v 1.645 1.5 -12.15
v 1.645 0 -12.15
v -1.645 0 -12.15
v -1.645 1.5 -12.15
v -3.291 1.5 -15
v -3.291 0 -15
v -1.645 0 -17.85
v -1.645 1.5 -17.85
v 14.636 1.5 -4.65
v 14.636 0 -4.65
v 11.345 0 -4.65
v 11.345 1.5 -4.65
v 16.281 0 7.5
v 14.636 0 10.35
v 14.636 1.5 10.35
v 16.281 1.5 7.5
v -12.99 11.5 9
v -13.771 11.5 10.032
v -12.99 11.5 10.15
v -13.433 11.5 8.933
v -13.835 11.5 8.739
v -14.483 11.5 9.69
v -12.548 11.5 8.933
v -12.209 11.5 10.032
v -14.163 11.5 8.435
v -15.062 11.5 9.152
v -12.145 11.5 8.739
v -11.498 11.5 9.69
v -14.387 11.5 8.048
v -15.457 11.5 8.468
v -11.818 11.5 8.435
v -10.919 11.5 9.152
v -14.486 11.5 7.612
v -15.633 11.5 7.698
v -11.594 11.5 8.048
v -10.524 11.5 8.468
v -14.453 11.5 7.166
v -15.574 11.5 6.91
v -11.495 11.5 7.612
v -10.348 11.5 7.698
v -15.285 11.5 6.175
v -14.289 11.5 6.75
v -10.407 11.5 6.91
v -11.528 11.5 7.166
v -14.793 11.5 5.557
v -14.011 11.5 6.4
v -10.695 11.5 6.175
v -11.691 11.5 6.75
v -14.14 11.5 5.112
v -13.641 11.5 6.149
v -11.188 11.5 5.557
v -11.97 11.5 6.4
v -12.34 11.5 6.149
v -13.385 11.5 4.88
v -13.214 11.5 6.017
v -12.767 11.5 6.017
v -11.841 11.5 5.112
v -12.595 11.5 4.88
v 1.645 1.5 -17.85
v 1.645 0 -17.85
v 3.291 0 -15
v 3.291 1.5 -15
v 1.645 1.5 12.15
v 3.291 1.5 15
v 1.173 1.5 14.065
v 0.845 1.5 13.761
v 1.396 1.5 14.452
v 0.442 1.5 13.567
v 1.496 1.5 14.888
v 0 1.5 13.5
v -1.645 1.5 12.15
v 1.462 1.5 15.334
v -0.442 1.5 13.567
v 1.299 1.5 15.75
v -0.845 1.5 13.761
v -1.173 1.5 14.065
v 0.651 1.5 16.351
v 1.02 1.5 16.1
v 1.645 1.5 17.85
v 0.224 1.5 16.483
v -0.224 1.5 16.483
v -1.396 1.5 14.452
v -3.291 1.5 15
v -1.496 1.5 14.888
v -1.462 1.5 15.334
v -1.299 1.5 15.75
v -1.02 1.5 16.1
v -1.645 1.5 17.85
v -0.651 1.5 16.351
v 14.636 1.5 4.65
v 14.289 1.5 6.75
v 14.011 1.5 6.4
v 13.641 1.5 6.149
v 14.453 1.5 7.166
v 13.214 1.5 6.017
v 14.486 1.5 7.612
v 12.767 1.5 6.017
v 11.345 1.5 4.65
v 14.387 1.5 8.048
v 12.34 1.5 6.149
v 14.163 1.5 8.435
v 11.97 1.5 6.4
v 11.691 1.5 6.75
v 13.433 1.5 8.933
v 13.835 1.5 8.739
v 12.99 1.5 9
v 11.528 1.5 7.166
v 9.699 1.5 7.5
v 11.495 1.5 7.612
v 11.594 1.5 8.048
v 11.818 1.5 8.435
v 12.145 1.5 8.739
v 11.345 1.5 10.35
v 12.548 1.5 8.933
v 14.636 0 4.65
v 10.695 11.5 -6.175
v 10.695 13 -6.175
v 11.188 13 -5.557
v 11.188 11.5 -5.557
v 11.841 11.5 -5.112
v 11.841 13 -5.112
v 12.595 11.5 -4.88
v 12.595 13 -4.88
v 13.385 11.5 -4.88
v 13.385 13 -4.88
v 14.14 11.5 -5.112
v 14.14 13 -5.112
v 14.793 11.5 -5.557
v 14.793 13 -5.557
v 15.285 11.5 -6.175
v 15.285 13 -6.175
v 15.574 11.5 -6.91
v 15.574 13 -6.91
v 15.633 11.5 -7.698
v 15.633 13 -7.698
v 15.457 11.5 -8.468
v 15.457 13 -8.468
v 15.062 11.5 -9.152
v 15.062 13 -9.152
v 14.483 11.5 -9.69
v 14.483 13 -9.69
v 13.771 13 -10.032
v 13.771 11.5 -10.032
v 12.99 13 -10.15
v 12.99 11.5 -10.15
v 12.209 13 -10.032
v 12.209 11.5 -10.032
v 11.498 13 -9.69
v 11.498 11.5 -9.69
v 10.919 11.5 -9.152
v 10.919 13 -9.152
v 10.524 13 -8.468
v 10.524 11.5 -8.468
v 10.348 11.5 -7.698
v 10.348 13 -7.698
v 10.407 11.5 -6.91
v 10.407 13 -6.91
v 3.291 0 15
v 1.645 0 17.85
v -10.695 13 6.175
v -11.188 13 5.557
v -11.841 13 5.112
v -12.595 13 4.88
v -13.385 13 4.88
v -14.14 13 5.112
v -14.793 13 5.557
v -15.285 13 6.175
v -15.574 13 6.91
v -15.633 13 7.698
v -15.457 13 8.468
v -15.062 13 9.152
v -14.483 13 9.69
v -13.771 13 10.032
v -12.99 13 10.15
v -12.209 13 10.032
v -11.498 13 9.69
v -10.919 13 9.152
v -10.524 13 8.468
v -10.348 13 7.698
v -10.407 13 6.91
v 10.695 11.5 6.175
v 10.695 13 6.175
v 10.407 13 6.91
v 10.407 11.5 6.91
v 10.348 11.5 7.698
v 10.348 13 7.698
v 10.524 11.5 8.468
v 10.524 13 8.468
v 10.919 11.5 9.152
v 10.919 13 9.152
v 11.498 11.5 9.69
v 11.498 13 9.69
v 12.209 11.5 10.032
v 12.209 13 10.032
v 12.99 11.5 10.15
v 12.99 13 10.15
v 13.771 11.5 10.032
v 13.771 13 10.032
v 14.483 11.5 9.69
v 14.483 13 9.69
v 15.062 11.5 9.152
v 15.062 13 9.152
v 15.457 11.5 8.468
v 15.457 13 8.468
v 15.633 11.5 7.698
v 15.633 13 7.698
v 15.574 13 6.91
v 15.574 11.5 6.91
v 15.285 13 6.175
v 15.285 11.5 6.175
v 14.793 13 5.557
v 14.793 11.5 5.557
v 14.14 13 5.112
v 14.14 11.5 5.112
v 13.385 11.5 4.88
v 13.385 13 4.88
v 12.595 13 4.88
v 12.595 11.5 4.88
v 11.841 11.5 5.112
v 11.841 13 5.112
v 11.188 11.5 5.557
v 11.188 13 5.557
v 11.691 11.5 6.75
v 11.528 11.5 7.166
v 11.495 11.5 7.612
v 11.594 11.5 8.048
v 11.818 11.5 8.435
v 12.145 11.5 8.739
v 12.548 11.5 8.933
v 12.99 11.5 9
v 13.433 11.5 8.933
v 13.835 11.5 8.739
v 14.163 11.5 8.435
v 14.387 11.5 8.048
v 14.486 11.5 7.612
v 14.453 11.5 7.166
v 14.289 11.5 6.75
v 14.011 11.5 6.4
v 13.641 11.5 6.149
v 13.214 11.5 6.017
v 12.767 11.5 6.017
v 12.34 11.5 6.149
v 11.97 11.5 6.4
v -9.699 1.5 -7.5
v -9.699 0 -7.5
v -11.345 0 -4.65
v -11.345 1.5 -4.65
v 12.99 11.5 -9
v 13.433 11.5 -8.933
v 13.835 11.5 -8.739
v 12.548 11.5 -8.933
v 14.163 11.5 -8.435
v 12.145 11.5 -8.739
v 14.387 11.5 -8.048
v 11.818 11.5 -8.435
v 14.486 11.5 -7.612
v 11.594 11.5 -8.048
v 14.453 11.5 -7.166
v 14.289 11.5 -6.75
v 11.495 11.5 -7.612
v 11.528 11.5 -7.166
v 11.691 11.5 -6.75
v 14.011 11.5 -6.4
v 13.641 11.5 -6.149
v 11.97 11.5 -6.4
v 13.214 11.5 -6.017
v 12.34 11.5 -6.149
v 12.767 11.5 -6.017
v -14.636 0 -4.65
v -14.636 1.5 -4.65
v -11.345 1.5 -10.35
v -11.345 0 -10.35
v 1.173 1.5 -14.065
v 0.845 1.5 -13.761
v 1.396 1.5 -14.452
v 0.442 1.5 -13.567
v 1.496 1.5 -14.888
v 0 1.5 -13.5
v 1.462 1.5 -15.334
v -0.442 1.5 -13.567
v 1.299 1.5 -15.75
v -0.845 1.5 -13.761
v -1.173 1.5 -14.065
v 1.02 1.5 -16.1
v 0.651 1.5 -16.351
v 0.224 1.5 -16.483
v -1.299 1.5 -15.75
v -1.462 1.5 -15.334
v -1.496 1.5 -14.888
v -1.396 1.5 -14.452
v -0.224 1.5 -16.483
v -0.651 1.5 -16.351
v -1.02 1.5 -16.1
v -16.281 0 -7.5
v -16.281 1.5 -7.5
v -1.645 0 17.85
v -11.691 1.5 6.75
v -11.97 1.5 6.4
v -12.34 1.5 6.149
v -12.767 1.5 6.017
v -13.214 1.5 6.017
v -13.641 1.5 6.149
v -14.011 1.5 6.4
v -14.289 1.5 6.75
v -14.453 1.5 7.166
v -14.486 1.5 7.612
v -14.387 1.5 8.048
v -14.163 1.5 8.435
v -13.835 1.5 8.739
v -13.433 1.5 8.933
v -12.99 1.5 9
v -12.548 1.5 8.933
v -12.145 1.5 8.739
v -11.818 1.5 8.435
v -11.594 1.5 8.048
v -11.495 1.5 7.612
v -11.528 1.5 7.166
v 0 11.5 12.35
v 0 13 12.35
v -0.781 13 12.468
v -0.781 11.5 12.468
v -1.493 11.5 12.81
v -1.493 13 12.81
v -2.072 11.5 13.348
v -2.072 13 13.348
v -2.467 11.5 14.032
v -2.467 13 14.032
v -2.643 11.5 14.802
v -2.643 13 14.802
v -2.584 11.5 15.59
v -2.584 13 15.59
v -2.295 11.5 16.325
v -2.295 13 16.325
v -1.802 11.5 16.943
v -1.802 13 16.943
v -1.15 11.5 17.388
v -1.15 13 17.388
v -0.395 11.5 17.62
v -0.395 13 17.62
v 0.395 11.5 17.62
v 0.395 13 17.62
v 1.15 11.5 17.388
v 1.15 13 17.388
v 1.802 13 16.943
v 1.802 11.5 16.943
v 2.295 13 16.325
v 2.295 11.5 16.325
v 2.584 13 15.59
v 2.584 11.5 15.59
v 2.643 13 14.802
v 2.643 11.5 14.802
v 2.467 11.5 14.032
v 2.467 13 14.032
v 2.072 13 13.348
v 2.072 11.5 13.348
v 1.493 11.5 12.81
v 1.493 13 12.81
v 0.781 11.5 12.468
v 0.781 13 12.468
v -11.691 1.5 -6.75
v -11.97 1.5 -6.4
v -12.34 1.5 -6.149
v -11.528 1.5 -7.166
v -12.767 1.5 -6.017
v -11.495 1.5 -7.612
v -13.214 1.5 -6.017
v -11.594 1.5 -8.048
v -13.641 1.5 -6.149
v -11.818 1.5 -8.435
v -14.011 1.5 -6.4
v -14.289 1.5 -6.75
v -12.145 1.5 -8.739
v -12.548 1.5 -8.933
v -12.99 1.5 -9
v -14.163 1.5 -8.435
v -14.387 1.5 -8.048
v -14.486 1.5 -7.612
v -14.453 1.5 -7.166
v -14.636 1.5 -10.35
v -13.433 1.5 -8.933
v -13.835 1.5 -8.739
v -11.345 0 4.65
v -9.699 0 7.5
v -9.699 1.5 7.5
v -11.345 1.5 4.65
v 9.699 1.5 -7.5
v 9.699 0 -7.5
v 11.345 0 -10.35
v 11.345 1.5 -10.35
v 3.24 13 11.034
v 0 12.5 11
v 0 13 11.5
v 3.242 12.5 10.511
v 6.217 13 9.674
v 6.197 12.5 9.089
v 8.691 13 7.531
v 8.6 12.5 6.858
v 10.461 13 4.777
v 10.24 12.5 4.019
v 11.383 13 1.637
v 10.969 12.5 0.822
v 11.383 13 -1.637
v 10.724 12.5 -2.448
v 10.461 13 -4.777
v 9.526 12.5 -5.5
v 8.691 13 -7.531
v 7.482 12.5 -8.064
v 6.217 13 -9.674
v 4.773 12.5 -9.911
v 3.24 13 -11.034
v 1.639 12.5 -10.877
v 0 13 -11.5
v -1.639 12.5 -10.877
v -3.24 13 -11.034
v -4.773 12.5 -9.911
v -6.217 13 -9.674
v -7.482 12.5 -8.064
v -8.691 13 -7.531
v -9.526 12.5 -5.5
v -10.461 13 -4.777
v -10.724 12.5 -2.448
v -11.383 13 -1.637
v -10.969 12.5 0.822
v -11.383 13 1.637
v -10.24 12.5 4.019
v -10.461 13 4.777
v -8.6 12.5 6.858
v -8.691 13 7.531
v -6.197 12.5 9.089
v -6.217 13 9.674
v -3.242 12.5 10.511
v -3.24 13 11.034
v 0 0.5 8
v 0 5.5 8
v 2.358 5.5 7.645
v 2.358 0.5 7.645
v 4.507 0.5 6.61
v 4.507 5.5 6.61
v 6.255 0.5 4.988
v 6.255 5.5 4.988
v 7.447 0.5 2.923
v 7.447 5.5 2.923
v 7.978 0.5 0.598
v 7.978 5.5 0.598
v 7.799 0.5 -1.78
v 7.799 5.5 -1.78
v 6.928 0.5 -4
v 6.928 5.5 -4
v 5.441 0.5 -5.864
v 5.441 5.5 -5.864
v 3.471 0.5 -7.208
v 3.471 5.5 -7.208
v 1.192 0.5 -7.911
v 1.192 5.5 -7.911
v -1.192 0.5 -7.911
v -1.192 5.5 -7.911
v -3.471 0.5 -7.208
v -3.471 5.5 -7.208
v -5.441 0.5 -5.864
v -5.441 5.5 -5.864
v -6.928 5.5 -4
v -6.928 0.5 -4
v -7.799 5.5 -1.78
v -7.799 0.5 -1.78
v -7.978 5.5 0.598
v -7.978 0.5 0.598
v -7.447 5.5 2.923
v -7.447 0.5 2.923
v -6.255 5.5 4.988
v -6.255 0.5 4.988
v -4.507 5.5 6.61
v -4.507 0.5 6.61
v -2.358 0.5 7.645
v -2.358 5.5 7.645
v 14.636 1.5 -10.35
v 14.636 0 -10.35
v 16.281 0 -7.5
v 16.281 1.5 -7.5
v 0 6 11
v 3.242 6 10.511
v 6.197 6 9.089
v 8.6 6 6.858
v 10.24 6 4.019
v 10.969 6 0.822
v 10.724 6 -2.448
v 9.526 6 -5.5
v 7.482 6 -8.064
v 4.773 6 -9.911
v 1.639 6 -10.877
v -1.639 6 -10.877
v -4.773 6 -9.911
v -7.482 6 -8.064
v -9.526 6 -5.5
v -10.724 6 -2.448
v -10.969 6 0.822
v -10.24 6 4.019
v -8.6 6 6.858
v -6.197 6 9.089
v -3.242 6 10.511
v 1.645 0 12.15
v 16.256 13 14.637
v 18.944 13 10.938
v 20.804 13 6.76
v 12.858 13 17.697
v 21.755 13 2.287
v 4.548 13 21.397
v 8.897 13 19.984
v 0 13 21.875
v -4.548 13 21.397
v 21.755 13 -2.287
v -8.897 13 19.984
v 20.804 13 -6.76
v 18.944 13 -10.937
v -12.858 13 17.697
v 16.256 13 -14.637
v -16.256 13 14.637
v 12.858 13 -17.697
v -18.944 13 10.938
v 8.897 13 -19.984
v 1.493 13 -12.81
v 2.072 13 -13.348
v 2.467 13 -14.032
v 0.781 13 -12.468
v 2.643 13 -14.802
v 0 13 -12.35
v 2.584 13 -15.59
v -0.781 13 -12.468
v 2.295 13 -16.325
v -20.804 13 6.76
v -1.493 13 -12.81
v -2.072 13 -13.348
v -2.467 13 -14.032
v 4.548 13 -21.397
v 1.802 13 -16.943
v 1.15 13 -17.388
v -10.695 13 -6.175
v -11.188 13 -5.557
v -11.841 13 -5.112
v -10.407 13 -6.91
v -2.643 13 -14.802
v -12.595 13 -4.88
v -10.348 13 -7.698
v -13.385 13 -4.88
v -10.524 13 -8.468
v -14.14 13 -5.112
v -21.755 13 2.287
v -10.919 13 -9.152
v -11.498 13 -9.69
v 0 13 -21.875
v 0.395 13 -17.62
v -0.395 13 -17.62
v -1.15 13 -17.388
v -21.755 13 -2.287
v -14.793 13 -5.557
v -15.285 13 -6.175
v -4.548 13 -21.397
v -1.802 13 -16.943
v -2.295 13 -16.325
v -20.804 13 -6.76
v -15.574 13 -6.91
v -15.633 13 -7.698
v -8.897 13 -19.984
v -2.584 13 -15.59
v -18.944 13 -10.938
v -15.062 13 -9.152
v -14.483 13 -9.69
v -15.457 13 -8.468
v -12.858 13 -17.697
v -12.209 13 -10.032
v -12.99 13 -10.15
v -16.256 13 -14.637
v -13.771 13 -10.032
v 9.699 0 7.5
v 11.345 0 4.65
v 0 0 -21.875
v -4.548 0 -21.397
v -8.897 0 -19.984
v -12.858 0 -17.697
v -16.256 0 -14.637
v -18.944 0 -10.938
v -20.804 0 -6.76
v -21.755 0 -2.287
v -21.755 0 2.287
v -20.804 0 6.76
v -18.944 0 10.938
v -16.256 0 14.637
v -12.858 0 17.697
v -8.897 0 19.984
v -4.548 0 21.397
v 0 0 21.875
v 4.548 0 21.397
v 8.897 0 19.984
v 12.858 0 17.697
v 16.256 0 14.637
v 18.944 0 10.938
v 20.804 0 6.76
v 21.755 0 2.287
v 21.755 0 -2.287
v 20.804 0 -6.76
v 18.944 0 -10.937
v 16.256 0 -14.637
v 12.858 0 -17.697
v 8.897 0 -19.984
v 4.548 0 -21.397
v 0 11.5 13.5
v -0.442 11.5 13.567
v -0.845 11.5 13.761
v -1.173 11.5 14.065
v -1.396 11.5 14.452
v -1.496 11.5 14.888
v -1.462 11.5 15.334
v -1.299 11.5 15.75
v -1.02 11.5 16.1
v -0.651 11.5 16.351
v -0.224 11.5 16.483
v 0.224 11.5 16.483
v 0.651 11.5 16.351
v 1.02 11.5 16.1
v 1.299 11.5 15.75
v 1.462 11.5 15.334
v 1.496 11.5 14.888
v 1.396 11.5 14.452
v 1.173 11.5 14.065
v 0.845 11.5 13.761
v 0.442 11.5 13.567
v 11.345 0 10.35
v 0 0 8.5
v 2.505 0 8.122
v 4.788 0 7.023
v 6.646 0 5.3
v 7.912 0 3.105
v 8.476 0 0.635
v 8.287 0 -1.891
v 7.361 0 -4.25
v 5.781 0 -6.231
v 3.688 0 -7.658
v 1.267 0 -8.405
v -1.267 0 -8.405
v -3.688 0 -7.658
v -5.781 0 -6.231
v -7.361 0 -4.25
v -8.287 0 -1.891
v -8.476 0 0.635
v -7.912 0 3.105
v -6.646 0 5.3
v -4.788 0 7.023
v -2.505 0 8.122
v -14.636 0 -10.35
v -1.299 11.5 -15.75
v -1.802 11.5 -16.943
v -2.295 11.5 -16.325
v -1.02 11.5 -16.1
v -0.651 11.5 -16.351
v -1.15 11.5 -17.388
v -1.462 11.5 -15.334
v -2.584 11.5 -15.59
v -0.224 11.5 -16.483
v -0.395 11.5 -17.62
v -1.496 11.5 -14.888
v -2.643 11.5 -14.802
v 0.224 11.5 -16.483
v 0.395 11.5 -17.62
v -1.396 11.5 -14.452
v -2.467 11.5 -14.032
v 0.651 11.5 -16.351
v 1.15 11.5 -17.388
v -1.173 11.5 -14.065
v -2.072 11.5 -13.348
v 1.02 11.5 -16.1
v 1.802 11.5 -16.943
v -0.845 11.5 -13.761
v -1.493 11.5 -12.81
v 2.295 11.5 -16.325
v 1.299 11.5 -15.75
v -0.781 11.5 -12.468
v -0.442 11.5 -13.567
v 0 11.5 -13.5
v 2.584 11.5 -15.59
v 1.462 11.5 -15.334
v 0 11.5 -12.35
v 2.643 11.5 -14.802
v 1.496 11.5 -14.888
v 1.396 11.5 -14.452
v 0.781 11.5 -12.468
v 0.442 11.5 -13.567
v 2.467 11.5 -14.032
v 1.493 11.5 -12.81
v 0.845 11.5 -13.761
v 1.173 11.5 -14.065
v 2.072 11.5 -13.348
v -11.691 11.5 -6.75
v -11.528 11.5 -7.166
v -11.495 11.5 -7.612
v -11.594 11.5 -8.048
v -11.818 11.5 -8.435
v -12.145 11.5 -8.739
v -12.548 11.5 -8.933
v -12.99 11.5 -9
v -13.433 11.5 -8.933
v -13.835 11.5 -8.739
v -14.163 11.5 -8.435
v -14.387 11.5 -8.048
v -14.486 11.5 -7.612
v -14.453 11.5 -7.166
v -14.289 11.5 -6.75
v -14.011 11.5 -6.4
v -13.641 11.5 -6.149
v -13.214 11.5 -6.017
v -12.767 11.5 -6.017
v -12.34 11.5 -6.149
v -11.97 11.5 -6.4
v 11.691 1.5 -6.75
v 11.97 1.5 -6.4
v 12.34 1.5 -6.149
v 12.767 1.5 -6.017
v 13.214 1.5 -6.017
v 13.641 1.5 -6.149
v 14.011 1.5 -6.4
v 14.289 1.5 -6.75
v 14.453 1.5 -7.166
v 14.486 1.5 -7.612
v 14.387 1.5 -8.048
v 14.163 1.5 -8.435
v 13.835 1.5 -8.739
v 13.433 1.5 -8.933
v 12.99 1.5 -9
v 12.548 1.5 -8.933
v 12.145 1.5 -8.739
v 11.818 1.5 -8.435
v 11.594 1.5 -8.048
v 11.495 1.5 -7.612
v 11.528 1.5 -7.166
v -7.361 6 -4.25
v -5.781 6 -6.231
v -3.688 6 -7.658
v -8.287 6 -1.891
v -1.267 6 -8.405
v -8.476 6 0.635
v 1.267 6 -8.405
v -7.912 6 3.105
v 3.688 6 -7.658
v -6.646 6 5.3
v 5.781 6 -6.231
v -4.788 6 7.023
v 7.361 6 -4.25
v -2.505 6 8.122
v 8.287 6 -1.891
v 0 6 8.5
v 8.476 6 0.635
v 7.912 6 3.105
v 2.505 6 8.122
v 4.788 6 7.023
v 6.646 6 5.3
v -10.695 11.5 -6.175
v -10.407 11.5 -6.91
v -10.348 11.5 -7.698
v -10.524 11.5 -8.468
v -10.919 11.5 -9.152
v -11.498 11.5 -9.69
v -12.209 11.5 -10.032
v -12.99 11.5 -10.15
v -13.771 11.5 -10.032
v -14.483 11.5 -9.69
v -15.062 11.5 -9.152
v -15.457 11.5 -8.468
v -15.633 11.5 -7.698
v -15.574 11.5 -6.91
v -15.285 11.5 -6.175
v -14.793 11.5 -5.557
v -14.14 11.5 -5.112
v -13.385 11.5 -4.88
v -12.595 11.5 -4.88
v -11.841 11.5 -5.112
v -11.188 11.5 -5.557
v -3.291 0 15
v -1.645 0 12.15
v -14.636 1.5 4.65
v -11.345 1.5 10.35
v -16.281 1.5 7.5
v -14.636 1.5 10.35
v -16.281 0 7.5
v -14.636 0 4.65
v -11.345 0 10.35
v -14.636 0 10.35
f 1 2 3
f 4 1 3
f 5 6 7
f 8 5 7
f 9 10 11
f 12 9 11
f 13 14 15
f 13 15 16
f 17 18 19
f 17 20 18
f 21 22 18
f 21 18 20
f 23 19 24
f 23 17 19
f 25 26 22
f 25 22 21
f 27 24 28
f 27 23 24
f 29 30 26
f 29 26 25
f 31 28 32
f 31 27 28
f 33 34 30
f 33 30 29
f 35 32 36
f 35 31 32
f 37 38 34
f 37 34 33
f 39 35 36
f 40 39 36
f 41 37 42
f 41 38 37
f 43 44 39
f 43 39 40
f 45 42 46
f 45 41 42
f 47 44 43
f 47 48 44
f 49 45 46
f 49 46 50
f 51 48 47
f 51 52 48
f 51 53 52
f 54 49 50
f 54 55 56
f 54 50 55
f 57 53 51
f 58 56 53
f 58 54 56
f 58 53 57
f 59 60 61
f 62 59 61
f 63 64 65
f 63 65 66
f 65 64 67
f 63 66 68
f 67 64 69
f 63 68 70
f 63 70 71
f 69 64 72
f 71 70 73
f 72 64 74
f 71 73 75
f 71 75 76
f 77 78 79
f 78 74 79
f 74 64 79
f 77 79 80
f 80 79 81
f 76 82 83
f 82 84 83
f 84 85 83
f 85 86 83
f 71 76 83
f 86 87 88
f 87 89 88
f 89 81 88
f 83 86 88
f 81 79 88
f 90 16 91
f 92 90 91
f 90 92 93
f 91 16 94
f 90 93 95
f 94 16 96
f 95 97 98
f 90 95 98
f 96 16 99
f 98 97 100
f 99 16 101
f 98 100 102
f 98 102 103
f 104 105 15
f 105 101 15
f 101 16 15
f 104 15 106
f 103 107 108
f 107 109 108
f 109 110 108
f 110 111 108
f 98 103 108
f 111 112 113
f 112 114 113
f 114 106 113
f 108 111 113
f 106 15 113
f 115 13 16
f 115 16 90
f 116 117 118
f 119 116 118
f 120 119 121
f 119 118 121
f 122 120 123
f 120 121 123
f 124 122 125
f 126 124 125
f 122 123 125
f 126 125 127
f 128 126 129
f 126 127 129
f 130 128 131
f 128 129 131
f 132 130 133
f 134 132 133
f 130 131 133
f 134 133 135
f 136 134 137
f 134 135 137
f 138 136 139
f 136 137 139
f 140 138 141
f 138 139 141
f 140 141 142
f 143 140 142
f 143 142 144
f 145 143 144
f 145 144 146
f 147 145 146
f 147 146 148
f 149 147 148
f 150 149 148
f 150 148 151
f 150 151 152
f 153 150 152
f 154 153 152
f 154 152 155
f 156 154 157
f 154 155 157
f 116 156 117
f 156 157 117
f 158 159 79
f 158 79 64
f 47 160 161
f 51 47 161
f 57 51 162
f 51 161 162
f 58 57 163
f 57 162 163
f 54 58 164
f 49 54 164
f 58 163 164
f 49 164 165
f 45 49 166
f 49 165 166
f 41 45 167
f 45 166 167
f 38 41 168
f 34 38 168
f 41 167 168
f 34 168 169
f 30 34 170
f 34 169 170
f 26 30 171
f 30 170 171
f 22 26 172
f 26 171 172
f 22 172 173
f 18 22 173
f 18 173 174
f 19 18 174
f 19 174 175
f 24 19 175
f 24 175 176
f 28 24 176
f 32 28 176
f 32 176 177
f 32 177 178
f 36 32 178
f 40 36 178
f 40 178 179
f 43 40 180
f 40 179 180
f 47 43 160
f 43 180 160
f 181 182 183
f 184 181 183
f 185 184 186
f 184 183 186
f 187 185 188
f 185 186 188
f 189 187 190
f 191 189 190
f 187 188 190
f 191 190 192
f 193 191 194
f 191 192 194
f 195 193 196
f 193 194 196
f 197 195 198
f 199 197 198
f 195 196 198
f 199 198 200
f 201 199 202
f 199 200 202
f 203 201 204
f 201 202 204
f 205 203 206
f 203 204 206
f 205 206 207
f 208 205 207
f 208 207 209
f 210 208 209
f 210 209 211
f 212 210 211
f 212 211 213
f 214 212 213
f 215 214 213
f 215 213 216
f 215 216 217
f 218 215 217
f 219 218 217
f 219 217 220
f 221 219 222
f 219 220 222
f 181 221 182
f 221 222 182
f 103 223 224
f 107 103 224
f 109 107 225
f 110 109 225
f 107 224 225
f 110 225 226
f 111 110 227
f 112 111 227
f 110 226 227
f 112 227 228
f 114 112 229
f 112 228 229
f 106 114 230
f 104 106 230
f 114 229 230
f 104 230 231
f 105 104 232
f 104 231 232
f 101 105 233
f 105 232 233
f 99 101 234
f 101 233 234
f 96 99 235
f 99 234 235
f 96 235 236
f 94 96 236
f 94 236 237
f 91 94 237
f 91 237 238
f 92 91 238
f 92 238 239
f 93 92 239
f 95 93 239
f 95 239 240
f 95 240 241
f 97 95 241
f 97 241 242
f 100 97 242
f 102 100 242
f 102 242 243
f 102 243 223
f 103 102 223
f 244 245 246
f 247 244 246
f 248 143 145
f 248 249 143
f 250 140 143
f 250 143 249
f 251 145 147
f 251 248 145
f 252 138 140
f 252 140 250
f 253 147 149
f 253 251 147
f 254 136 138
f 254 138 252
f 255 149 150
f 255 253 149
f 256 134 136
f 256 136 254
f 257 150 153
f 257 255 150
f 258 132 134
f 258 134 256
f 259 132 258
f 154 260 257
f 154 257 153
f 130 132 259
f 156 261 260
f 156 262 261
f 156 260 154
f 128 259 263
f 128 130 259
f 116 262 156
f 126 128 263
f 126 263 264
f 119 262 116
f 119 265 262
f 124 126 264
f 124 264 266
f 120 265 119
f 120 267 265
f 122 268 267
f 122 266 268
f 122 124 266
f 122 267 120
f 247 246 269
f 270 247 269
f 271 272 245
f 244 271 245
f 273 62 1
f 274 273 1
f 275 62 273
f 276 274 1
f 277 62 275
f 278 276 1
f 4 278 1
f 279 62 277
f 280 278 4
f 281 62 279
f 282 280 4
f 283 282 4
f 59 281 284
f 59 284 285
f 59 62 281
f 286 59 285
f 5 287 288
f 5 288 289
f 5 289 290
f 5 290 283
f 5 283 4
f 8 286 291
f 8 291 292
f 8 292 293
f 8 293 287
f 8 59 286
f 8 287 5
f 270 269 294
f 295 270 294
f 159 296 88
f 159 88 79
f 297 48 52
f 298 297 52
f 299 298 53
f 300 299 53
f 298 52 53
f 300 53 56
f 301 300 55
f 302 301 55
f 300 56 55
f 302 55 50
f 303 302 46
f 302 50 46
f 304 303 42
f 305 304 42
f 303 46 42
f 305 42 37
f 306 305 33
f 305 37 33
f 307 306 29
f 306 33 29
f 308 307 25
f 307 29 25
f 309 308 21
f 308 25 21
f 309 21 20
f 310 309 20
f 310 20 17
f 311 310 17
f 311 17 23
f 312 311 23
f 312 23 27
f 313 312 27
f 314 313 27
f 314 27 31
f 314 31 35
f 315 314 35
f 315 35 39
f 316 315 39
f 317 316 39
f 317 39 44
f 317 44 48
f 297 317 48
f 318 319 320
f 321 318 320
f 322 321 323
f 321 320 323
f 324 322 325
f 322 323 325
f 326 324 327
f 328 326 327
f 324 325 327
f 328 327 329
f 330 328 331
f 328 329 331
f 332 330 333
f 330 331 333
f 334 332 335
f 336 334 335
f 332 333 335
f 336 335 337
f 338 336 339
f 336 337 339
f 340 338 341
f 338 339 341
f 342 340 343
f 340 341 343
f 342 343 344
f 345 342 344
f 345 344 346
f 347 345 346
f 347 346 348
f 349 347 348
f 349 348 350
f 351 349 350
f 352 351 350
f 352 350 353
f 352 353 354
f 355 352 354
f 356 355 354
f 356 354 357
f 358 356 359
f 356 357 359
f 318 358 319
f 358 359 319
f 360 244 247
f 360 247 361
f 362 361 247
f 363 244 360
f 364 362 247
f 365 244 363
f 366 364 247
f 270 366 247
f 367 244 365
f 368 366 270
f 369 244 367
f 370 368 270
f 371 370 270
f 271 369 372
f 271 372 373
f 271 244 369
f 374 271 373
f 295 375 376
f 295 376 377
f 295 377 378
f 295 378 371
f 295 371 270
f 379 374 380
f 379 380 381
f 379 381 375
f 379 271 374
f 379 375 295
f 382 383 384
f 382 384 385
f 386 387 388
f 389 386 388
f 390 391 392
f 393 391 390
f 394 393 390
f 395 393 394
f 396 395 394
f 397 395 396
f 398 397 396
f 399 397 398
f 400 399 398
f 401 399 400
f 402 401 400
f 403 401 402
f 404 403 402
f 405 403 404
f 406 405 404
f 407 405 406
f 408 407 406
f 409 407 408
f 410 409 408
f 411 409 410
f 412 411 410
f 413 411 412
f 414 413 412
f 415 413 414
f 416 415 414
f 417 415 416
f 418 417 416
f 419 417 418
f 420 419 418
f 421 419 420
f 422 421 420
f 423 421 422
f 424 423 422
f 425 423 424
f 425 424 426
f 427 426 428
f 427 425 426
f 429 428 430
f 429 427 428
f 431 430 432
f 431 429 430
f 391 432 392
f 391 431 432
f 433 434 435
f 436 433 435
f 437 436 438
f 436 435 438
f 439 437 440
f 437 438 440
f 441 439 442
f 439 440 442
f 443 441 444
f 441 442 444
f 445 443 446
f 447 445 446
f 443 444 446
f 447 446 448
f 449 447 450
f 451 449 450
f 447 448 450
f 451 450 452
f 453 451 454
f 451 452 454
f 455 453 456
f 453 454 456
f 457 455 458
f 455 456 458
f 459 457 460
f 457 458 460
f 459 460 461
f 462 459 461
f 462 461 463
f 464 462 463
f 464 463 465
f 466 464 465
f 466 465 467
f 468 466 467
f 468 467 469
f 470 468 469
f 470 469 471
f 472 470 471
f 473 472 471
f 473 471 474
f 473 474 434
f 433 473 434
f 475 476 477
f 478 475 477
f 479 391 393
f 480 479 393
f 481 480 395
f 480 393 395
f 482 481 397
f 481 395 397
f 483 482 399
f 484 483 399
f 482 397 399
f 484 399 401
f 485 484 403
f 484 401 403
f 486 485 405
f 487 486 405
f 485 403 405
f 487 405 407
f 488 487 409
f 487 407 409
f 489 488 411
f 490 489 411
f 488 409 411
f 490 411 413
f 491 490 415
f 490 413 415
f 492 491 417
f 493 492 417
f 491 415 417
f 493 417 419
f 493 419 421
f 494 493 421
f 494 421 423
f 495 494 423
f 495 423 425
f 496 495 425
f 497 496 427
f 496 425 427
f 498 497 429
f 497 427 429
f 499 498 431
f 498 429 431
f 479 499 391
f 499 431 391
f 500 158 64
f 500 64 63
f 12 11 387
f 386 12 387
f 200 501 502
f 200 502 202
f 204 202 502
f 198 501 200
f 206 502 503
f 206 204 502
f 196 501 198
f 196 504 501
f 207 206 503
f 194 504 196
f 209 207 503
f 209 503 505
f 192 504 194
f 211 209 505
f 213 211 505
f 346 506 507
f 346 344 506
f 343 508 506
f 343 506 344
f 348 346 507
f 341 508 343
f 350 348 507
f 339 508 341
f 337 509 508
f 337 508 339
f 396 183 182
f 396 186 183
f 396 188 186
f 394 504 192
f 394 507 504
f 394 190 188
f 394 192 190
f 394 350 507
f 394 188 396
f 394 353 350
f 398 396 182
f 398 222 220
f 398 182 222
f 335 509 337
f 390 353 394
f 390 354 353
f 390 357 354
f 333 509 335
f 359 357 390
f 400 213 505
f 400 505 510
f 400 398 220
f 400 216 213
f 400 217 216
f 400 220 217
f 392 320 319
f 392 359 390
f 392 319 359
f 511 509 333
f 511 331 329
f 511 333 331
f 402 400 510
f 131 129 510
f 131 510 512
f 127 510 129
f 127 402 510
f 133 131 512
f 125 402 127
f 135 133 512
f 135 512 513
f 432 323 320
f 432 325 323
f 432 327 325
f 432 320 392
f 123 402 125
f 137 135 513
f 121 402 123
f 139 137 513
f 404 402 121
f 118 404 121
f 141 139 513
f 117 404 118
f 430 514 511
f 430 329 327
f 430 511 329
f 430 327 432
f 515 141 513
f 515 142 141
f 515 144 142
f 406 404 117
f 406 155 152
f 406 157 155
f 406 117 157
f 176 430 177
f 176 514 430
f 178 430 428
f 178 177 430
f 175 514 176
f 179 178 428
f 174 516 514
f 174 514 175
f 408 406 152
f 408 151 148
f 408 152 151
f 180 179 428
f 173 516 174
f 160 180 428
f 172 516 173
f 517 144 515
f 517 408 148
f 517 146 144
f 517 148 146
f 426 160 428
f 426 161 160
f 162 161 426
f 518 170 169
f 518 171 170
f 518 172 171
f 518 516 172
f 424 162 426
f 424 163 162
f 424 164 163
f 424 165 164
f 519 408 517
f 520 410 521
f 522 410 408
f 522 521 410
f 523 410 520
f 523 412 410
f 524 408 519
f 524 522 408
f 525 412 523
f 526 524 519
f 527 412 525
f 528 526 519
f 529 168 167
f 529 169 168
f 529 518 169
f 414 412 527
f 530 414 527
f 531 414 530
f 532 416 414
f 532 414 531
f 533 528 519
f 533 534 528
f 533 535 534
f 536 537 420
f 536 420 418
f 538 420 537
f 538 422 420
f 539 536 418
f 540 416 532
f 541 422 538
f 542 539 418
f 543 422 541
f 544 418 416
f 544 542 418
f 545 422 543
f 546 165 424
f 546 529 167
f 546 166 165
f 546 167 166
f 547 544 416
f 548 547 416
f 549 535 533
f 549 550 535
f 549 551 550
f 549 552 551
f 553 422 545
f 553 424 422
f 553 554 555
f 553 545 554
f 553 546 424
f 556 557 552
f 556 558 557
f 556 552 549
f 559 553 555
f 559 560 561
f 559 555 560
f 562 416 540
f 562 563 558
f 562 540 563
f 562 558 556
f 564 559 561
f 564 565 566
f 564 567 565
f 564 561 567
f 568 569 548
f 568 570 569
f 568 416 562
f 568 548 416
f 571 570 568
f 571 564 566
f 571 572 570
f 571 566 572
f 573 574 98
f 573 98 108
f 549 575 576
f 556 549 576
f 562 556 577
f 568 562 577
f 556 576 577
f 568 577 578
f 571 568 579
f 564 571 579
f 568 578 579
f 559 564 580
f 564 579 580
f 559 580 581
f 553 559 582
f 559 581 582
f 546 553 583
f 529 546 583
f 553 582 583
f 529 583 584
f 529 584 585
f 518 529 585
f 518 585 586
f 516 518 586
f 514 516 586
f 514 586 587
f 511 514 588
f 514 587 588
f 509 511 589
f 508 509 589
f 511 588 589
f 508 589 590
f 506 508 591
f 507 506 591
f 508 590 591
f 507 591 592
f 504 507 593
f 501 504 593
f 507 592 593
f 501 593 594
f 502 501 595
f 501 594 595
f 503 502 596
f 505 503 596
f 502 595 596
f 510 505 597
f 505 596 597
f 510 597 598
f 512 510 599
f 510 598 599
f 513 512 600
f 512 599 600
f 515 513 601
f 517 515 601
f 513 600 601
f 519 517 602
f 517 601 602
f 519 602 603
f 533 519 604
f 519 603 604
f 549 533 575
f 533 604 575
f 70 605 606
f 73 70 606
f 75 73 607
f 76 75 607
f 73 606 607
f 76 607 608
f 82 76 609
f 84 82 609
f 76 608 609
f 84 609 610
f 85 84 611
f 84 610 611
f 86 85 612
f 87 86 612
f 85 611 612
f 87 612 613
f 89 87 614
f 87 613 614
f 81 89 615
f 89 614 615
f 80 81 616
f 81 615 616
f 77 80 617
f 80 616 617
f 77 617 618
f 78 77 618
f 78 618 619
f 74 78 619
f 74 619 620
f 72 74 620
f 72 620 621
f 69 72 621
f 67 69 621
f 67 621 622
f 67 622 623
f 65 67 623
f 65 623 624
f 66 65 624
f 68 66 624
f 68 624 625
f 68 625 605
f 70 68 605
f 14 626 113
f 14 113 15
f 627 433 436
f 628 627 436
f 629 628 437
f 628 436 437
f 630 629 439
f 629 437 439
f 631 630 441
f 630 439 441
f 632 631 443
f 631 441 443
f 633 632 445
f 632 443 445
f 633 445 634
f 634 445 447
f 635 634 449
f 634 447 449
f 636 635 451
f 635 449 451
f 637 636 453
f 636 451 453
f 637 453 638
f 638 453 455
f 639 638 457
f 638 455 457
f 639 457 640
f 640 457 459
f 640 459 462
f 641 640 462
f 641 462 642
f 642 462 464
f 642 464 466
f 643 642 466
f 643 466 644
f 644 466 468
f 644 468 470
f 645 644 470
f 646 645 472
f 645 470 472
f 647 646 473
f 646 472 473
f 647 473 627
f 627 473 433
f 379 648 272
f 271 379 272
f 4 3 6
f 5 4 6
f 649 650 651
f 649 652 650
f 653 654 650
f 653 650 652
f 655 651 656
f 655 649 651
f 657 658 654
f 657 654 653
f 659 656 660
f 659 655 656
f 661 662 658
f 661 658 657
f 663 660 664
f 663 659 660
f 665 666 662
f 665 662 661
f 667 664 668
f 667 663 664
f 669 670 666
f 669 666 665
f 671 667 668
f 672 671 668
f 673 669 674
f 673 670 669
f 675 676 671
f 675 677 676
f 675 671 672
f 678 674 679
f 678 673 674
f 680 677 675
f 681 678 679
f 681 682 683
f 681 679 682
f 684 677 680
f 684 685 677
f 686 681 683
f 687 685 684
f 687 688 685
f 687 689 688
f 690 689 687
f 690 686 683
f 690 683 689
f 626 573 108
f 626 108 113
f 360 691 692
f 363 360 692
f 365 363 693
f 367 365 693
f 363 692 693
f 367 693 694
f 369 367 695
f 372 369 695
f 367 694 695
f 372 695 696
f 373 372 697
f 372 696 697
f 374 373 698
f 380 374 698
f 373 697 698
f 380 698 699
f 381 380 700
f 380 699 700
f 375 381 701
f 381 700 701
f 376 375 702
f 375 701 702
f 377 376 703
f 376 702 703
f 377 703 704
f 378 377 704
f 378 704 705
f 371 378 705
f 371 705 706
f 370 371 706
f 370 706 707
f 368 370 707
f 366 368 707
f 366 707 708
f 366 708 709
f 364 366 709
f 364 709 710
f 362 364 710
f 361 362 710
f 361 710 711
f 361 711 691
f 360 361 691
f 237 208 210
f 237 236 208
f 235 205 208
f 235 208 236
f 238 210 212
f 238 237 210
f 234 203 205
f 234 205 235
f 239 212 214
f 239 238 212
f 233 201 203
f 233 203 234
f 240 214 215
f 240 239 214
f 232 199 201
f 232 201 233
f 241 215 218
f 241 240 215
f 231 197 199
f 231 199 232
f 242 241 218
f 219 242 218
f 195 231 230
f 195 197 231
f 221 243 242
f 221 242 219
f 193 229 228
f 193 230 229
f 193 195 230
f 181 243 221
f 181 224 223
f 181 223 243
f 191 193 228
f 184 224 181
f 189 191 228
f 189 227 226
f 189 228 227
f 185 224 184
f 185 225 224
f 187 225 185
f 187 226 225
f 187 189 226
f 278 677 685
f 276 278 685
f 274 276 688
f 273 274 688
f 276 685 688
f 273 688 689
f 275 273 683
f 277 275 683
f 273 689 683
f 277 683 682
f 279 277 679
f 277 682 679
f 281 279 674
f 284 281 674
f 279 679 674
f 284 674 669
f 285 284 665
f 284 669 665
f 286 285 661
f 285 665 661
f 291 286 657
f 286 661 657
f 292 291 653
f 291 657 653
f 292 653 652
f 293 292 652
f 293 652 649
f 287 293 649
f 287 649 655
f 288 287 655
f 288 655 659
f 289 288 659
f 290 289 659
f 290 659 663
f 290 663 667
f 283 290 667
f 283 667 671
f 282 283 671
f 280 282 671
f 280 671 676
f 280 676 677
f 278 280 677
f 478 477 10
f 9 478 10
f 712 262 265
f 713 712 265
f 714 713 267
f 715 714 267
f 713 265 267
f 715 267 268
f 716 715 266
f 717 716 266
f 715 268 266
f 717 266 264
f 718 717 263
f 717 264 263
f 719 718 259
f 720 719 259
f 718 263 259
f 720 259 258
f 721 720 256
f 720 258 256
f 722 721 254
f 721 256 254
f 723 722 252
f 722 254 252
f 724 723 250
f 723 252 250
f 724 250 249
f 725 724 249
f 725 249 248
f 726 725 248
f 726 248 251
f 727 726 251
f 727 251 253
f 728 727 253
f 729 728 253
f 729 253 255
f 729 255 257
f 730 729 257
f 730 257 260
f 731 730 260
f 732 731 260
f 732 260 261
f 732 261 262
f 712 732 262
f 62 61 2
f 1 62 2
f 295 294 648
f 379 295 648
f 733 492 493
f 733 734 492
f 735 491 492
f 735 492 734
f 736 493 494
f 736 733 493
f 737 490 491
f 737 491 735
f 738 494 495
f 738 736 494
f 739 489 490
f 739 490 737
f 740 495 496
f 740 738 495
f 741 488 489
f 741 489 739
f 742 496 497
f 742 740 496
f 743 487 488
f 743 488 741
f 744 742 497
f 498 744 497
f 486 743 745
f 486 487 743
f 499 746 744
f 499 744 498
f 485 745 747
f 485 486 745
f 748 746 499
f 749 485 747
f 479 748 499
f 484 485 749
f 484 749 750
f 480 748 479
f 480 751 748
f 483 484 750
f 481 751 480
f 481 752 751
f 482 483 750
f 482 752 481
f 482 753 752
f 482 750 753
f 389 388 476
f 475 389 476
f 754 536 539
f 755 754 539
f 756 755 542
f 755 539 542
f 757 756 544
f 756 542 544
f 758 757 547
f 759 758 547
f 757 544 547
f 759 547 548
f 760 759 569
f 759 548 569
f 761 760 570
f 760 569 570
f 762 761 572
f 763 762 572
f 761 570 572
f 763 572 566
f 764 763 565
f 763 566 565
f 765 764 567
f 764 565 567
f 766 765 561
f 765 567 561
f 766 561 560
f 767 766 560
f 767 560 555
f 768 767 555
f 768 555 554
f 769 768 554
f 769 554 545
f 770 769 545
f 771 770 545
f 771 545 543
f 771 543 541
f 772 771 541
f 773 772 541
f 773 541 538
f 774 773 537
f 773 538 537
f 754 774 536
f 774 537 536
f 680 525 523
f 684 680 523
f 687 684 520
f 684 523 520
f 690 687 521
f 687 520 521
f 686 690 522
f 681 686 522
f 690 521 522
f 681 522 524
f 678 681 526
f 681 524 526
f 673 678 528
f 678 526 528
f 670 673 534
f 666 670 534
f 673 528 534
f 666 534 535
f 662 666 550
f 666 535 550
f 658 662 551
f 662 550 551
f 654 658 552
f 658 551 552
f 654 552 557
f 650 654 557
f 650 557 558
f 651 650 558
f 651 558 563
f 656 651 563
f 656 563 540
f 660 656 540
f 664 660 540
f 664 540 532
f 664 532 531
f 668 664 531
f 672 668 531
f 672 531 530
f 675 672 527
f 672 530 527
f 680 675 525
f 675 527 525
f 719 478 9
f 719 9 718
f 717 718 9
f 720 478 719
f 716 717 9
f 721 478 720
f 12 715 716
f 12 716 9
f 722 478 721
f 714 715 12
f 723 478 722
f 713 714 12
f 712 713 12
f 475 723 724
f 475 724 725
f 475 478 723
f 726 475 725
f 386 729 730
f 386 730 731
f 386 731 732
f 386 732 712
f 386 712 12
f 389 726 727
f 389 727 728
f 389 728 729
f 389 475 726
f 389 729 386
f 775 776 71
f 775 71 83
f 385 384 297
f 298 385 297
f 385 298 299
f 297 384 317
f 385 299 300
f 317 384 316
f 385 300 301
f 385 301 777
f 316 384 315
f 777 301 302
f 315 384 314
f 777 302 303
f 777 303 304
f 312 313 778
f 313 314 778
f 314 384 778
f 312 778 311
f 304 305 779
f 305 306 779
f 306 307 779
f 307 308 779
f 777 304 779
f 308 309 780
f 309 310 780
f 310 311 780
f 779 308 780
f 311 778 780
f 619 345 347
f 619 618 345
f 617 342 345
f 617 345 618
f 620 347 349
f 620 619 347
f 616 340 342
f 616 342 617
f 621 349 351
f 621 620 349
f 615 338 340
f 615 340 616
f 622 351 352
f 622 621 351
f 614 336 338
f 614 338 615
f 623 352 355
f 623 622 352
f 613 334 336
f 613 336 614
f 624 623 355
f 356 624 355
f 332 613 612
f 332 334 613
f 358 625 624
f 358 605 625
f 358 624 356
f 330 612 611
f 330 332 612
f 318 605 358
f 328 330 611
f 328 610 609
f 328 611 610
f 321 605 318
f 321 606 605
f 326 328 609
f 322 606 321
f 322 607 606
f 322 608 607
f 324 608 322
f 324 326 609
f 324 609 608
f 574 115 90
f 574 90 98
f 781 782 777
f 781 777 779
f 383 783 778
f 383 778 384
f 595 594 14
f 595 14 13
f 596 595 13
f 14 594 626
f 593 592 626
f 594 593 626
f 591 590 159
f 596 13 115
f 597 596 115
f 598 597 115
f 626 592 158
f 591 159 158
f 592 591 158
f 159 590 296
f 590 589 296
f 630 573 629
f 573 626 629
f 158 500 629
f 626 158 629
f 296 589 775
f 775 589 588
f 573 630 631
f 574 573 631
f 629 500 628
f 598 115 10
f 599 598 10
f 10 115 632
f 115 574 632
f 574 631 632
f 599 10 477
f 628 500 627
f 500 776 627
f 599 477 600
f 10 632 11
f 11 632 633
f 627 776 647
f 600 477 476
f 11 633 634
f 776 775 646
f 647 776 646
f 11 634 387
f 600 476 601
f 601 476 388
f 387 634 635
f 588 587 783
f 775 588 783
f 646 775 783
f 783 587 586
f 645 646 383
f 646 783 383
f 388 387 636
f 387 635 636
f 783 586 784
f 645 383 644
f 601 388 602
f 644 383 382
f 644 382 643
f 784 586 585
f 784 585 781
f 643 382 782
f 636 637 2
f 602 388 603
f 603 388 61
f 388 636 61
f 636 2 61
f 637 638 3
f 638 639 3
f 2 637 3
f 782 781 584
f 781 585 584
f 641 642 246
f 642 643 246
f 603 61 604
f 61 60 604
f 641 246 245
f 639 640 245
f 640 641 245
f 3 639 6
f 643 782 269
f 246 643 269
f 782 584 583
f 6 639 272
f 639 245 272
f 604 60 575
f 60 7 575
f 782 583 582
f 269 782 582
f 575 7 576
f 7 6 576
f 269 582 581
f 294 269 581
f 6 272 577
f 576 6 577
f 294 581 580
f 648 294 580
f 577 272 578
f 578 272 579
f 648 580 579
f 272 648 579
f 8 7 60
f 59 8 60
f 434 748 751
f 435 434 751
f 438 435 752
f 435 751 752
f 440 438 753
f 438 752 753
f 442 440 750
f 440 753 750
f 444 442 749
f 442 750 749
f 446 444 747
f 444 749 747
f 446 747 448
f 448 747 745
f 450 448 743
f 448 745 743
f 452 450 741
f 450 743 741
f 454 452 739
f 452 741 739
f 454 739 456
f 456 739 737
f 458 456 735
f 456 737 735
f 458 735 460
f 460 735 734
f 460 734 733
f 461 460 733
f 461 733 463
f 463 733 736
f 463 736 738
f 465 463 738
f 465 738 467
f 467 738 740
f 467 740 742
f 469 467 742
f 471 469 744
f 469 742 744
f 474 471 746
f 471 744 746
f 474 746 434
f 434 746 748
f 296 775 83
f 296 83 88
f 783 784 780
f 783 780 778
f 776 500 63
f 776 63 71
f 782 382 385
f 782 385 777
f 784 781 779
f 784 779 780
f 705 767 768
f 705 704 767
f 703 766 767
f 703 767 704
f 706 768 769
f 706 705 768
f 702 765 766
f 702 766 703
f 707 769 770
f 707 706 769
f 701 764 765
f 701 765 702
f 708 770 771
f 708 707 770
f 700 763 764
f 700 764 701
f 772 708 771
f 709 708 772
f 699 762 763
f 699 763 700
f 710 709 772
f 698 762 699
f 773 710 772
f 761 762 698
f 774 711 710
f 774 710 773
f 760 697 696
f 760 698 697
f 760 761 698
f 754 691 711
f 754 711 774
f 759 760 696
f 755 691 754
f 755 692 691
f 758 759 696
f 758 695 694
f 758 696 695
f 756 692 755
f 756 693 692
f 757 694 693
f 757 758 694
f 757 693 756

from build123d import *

# Parameters (mm, degrees)
SKETCH1_R           = 21.875
BOSS_EXTRUDE1_DEPTH = 13
SKETCH2_R           = 11
CUT_EXTRUDE1_DEPTH  = 7
CUT_EXTRUDE2_REACH  = 33.718
SKETCH3_R           = 8
CUT_EXTRUDE3_REACH  = 35.556
SKETCH4_R           = 1.5
CIRPATTERN1_COUNT   = 6
CHAMFER1_SIZE       = 0.5
SKETCH5_R           = 2.65
CUT_EXTRUDE4_DEPTH  = 1.5
CIRPATTERN2_COUNT   = 6
CUT_EXTRUDE5_DEPTH  = 1.5


with BuildPart() as part:
    # Sketch1 → Boss-Extrude1 (new body)
    with BuildSketch(Plane(origin=(0, 0, 0), x_dir=(1, 0, 0), z_dir=(0, 1, 0))):
        with Locations(Location((0, 0, 0), (0, 0, 90))):
            Circle(SKETCH1_R)
    extrude(amount=BOSS_EXTRUDE1_DEPTH)

    # Sketch2 → Cut-Extrude1 (cut)
    with BuildSketch(Plane(origin=(0, 13, 0), x_dir=(1, 0, 0), z_dir=(0, 1, 0))):
        with Locations(Location((0, 0, 0), (0, 0, 270))):
            Circle(SKETCH2_R)
    extrude(amount=-CUT_EXTRUDE1_DEPTH, mode=Mode.SUBTRACT)

    # Sketch3 → Cut-Extrude2 (cut, up to next)
    with BuildSketch(Plane(origin=(0, 6, 0), x_dir=(1, 0, 0), z_dir=(0, 1, 0)), mode=Mode.PRIVATE) as cut_extrude2_sk1:
        with Locations(Location((0, 0, 0), (0, 0, 270))):
            Circle(SKETCH3_R)
    cut_extrude2_tool1 = extrude(cut_extrude2_sk1.sketch, amount=-CUT_EXTRUDE2_REACH, mode=Mode.PRIVATE) & part.part
    add(cut_extrude2_tool1.solids().sort_by_distance((0, 6, 0))[0], mode=Mode.SUBTRACT)

    # Sketch4 → Cut-Extrude3 (cut, up to next)
    with BuildSketch(Plane(origin=(0, 13, 0), x_dir=(1, 0, 0), z_dir=(0, 1, 0)), mode=Mode.PRIVATE) as cut_extrude3_sk1:
        with Locations(Location((0, 15, 0), (0, 0, 270))):
            Circle(SKETCH4_R)
    cut_extrude3_tool1 = extrude(cut_extrude3_sk1.sketch, amount=-CUT_EXTRUDE3_REACH, mode=Mode.PRIVATE) & part.part
    cut_extrude3 = cut_extrude3_tool1.solids().sort_by_distance((0, 13, -15))[0]
    add(cut_extrude3, mode=Mode.SUBTRACT)

    # CirPattern1: Cut-Extrude3 ×6 about axis
    cirpattern1_axis = Axis((0, 0, 0), (0, 1, 0))
    for i in range(1, CIRPATTERN1_COUNT):
        add(cut_extrude3.rotate(cirpattern1_axis, i * 360 / CIRPATTERN1_COUNT), mode=Mode.SUBTRACT)

    # Chamfer1
    chamfer1_edges = [part.edges().sort_by_distance(p)[0] for p in [
        (0, 6, -8),
        (0, 0, -8),
        (0, 13, -11),
    ]]
    chamfer(chamfer1_edges, length=CHAMFER1_SIZE)

    # Sketch5 → Cut-Extrude4 (cut)
    with BuildSketch(Plane(origin=(0, 13, 0), x_dir=(1, 0, 0), z_dir=(0, 1, 0))):
        with Locations(Location((0, 15, 0), (0, 0, 270))):
            Circle(SKETCH5_R)
    cut_extrude4 = extrude(amount=-CUT_EXTRUDE4_DEPTH, mode=Mode.SUBTRACT)

    # CirPattern2: Cut-Extrude4 ×6 about axis
    cirpattern2_axis = Axis((0, 0, 0), (0, 1, 0))
    for i in range(1, CIRPATTERN2_COUNT):
        add(cut_extrude4.rotate(cirpattern2_axis, i * 360 / CIRPATTERN2_COUNT), mode=Mode.SUBTRACT)

    # Sketch6 → Cut-Extrude5 (cut)
    with BuildSketch(Plane(origin=(0, 0, 0), x_dir=(-1, 0, 0), z_dir=(0, -1, 0))):
        Polygon((14.635829324, 10.35), (11.34493279, 10.35), (9.699484522, 7.5), (11.34493279, 4.65), (14.635829324, 4.65), (16.281277591, 7.5), align=None)
        Polygon((3.290896534, 15), (1.645448267, 17.85), (-1.645448267, 17.85), (-3.290896534, 15), (-1.645448267, 12.15), (1.645448267, 12.15), align=None)
        Polygon((-11.34493279, 10.35), (-14.635829324, 10.35), (-16.281277591, 7.5), (-14.635829324, 4.65), (-11.34493279, 4.65), (-9.699484522, 7.5), align=None)
    cut_extrude5 = extrude(amount=-CUT_EXTRUDE5_DEPTH, mode=Mode.SUBTRACT)

    # Mirror1: Cut-Extrude5 across plane
    add(cut_extrude5.mirror(Plane.XY), mode=Mode.SUBTRACT)


solid = part.part
